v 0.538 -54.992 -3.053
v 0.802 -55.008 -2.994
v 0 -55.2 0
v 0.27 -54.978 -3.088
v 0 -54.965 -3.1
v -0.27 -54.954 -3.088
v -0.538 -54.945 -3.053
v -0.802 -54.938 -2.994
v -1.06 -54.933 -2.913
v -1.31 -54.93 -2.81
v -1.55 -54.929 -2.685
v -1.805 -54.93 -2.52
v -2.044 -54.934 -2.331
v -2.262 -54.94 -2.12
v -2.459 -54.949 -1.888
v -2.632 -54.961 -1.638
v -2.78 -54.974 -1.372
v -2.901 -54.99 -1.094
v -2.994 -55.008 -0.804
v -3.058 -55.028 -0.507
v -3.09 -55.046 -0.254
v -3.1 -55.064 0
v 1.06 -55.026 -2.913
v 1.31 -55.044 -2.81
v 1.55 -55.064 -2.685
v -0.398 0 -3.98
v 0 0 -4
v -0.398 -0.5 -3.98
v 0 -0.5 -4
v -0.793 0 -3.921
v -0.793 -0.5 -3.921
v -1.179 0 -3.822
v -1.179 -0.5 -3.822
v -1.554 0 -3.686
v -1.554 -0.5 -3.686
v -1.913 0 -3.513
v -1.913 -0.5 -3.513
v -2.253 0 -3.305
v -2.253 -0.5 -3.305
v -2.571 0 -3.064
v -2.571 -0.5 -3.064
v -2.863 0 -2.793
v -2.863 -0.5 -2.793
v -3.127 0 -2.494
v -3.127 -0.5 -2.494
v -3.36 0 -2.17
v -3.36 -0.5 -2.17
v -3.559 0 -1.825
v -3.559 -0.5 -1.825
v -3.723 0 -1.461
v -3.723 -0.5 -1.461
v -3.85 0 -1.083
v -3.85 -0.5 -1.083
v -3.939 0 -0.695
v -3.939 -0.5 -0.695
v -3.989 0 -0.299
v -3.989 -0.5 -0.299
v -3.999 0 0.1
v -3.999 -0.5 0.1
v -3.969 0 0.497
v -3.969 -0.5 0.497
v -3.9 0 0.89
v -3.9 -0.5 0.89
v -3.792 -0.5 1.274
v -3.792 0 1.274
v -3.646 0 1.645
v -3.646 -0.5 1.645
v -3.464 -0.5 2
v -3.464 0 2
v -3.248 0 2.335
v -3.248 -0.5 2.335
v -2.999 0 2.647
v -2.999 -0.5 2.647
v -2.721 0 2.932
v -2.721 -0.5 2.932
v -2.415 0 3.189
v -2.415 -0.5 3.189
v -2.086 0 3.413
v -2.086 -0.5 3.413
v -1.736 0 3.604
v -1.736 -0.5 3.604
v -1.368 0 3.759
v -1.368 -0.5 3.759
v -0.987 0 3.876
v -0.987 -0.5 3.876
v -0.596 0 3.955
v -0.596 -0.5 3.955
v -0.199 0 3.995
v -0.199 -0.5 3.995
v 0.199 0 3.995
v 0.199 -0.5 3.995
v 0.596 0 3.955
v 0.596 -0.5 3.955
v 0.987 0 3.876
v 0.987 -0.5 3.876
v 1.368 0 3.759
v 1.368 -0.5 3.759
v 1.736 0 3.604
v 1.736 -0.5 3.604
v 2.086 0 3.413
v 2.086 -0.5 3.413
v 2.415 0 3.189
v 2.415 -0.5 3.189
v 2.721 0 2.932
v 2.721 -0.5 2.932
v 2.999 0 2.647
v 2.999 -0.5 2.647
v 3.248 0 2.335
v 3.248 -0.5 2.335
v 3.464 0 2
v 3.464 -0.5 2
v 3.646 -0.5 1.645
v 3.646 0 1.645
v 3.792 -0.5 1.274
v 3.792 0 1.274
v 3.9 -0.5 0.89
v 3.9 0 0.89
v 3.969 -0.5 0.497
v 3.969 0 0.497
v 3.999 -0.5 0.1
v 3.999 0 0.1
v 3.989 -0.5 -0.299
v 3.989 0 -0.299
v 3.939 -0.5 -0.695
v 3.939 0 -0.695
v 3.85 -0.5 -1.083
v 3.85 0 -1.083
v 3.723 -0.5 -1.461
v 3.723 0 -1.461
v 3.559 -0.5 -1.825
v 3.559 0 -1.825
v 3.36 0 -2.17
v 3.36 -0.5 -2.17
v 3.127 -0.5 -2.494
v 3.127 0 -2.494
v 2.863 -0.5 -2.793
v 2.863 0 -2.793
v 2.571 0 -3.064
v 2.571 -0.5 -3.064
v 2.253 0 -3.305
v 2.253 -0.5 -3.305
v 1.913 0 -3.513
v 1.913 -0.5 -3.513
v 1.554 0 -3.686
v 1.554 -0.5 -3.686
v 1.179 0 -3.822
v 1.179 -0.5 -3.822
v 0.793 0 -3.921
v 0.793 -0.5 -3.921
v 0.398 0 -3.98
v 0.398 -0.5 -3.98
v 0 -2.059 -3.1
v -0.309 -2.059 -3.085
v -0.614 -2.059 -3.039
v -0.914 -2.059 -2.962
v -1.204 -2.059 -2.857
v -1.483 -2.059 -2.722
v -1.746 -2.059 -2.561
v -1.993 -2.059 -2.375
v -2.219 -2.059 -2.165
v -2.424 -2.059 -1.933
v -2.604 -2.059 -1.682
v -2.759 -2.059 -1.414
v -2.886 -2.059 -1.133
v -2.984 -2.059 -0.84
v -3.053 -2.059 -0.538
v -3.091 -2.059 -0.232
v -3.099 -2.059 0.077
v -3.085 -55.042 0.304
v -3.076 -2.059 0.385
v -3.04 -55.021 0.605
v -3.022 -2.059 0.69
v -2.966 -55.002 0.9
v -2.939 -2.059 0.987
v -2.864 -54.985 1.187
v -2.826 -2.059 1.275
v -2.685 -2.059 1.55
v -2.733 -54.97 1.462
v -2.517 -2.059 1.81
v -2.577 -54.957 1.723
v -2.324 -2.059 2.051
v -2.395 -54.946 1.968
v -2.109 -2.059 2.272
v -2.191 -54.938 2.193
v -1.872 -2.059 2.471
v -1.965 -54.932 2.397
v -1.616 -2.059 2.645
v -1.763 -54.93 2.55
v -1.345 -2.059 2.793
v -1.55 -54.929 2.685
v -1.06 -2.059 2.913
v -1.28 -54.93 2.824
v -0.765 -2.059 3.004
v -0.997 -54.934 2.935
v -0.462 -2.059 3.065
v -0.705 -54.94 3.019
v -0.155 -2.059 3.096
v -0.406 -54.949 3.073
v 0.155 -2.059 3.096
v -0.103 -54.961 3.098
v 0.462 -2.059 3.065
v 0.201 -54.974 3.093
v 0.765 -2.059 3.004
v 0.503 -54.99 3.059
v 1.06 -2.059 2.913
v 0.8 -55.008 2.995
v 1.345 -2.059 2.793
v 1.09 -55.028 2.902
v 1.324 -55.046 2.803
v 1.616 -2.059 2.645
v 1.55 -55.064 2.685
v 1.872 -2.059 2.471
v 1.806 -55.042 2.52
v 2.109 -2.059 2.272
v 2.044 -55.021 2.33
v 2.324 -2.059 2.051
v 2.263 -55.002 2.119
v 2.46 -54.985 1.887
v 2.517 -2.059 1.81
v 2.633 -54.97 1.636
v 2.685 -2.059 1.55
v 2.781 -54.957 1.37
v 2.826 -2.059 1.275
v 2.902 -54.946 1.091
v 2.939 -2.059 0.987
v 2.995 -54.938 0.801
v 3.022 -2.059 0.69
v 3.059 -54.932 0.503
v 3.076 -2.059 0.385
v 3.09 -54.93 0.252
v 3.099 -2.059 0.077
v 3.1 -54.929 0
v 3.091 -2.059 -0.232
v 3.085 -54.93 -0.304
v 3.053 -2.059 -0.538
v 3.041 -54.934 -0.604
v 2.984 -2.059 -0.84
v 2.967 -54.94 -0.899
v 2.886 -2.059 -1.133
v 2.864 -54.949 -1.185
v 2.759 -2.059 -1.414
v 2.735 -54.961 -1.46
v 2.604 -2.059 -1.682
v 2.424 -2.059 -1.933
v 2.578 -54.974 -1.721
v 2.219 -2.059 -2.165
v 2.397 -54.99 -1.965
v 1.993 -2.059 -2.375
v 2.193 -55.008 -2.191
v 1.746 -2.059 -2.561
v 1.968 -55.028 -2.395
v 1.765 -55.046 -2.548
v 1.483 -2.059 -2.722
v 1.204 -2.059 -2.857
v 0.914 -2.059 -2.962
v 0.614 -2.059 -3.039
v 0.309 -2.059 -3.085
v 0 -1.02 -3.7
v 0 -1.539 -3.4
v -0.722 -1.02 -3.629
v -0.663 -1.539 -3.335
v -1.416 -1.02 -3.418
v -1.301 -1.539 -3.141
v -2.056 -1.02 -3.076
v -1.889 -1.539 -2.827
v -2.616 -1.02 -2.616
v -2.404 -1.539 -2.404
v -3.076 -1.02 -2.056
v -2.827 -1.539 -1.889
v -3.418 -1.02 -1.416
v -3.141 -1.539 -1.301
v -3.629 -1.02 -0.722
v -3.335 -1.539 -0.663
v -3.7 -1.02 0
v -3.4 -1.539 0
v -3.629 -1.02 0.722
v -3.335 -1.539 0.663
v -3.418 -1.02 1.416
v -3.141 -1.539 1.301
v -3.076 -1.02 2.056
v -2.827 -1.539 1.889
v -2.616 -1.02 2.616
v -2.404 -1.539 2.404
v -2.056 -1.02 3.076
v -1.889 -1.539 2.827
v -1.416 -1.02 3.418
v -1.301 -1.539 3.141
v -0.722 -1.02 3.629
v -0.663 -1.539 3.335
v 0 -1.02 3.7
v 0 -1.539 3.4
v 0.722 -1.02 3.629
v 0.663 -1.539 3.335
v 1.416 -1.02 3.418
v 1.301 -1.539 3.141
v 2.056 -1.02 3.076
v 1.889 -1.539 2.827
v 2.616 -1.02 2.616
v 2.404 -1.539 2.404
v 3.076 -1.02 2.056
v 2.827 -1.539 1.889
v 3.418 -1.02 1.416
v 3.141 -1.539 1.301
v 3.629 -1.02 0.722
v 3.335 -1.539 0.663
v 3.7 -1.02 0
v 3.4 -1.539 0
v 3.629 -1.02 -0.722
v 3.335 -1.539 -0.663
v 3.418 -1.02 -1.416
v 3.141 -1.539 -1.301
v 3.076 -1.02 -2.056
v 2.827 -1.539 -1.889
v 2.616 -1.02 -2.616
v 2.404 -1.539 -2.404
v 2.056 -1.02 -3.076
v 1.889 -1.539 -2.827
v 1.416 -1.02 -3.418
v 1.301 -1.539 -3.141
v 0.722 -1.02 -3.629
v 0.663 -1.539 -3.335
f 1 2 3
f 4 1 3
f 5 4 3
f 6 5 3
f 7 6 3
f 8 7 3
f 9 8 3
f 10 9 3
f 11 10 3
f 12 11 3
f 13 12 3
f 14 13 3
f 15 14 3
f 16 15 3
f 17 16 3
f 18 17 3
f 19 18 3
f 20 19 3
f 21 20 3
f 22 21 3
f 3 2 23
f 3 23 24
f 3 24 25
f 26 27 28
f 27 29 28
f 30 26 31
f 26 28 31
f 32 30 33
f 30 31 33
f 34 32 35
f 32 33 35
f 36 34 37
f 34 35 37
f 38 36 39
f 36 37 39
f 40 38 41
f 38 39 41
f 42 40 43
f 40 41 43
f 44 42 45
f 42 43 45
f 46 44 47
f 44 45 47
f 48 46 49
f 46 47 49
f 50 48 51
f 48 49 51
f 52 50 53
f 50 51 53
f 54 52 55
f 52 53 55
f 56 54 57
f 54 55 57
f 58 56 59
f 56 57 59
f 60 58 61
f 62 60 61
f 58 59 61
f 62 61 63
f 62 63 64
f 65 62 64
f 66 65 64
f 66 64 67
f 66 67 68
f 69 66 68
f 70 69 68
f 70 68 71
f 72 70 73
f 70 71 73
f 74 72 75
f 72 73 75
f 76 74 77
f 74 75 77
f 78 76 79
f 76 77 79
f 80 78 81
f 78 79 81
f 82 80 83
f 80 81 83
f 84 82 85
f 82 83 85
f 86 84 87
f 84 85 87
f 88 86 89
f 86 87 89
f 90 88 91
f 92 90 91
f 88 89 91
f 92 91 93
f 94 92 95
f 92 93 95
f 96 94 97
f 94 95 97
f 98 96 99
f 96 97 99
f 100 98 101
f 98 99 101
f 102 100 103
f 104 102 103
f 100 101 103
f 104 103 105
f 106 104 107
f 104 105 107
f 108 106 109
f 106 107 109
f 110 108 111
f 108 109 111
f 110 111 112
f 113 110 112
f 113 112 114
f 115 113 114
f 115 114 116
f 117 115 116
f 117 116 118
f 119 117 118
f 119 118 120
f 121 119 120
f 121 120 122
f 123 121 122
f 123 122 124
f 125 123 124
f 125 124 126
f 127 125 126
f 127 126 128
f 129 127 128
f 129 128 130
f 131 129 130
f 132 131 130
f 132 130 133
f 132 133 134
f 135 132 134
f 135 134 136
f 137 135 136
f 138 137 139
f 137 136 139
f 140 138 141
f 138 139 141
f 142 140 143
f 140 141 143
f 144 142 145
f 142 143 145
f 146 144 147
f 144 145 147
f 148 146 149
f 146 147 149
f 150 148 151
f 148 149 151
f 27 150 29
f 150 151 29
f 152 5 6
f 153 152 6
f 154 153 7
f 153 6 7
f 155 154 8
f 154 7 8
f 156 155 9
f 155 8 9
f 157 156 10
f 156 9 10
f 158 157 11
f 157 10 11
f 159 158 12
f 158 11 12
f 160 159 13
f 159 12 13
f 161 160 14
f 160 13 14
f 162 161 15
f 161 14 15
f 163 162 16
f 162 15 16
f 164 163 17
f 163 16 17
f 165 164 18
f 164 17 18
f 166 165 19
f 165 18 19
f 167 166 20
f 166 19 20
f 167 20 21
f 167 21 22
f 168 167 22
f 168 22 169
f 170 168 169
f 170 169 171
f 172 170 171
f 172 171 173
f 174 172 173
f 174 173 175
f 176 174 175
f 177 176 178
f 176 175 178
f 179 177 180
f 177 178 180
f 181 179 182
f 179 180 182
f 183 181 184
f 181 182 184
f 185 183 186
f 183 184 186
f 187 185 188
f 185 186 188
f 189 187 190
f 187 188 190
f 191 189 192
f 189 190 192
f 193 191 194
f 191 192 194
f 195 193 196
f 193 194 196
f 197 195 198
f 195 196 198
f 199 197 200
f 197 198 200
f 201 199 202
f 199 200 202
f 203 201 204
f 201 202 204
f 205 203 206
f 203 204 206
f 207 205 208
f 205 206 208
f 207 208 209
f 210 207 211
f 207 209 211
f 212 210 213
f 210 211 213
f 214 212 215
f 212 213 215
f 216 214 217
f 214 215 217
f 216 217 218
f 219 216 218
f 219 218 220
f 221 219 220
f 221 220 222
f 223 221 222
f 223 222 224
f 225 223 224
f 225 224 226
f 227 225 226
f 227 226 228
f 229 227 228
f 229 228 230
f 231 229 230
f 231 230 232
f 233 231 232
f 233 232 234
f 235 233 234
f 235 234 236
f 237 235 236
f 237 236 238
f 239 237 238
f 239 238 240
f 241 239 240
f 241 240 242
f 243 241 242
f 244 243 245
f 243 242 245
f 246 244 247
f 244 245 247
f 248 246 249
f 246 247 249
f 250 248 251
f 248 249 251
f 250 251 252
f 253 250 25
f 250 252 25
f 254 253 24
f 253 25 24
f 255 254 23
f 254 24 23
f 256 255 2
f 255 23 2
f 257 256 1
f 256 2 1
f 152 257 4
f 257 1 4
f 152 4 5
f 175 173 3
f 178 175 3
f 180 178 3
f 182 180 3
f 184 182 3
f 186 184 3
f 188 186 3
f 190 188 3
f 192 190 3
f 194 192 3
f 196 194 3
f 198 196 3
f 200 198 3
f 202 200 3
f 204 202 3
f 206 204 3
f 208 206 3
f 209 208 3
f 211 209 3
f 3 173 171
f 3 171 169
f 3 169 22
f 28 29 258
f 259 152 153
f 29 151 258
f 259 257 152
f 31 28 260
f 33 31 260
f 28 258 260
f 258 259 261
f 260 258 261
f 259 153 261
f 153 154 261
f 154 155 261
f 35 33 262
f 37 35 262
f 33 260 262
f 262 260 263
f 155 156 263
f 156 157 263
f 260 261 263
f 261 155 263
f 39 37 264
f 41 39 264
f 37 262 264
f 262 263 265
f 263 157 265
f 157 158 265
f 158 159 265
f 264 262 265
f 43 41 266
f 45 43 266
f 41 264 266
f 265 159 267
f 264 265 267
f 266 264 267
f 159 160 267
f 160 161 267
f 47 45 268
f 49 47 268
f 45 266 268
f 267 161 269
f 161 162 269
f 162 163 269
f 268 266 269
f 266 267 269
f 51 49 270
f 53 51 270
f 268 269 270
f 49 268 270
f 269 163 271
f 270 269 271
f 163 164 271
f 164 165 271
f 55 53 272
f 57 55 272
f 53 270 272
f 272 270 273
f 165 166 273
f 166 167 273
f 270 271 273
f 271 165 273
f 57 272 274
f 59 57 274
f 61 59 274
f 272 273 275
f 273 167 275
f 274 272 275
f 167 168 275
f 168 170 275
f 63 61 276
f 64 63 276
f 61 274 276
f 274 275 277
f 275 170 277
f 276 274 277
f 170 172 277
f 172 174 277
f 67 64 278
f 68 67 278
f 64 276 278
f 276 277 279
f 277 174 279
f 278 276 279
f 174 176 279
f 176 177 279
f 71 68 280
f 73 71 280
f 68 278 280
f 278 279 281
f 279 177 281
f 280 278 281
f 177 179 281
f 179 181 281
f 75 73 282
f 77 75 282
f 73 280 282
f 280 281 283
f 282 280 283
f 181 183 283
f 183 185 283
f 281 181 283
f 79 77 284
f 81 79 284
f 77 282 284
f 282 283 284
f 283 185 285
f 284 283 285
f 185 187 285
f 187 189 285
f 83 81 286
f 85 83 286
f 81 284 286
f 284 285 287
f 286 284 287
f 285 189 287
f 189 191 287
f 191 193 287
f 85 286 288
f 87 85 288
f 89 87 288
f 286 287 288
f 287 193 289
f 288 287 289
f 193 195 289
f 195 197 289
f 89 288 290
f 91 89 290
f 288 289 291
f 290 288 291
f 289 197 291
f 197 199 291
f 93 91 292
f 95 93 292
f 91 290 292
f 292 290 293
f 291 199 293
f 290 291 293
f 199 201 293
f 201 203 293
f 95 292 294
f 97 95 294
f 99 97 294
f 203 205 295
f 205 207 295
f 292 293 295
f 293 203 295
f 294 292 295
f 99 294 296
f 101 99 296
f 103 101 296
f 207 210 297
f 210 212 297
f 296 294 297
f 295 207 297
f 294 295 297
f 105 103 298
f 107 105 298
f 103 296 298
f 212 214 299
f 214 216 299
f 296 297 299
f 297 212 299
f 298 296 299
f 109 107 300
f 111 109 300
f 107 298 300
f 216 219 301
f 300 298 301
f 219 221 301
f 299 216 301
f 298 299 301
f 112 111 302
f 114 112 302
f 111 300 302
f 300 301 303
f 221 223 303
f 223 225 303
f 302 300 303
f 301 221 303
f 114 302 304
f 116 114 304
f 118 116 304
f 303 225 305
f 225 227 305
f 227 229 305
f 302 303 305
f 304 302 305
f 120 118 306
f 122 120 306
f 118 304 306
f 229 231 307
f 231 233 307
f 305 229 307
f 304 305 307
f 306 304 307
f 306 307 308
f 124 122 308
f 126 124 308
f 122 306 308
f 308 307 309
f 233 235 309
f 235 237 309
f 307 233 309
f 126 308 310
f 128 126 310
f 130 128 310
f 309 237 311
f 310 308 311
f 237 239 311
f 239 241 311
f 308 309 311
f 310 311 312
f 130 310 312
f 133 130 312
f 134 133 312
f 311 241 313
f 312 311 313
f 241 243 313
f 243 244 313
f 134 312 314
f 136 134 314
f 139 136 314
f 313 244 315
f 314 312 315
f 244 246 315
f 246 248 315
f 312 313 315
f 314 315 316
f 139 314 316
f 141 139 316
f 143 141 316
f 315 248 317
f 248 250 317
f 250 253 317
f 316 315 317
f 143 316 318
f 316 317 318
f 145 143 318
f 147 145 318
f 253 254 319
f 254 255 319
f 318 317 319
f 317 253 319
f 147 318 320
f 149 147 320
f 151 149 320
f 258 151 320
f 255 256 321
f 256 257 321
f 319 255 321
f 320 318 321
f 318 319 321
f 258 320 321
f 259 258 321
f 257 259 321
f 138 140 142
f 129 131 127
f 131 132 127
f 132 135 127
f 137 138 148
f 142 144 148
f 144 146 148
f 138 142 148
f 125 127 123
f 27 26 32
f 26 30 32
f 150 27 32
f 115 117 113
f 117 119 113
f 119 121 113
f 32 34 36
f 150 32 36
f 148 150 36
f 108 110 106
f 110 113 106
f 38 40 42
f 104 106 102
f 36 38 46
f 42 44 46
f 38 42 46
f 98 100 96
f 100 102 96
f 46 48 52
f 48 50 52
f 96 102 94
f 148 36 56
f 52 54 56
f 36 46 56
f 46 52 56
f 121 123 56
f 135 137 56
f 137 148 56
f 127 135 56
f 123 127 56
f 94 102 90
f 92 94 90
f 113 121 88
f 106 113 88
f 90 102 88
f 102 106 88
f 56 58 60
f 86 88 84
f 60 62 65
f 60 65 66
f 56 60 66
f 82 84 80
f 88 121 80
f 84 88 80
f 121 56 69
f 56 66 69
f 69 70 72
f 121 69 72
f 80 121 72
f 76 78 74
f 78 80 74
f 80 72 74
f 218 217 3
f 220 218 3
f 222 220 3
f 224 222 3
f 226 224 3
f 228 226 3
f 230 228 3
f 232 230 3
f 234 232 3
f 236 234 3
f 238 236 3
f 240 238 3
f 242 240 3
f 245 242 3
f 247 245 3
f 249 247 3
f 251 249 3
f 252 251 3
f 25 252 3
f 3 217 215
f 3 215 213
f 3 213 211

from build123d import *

# Parameters (mm, degrees)
CUT_EXTRUDE1_DEPTH = 56.489098028
CIRPATTERN1_COUNT  = 3


with BuildPart() as part:
    # Sketch1 → Revolve1 (revolve)
    with BuildSketch(Plane.XY, mode=Mode.PRIVATE) as revolve1_sk:
        Polygon((0, 0), (4, 0), (4, -0.5), (3.1, -2.058845727), (3.1, -55.2), (0, -55.2), align=None)
    revolve(revolve1_sk.sketch.rotate(Axis((0, -60.2, 0), (0, 1, 0)), 90), axis=Axis((0, -60.2, 0), (0, 1, 0)))

    # Sketch2 → Cut-Extrude1 (cut, symmetric)
    with BuildSketch(Plane.XY):
        Polygon((0, -55.2), (3.1, -55.2), (3.1, -54.928785143), align=None)
    cut_extrude1 = extrude(amount=CUT_EXTRUDE1_DEPTH, both=True, mode=Mode.SUBTRACT)

    # CirPattern1: Cut-Extrude1 ×3 about axis
    cirpattern1_axis = Axis((0, 0, 0), (0, 1, 0))
    for i in range(1, CIRPATTERN1_COUNT):
        add(cut_extrude1.rotate(cirpattern1_axis, i * 360 / CIRPATTERN1_COUNT), mode=Mode.SUBTRACT)


solid = part.part
